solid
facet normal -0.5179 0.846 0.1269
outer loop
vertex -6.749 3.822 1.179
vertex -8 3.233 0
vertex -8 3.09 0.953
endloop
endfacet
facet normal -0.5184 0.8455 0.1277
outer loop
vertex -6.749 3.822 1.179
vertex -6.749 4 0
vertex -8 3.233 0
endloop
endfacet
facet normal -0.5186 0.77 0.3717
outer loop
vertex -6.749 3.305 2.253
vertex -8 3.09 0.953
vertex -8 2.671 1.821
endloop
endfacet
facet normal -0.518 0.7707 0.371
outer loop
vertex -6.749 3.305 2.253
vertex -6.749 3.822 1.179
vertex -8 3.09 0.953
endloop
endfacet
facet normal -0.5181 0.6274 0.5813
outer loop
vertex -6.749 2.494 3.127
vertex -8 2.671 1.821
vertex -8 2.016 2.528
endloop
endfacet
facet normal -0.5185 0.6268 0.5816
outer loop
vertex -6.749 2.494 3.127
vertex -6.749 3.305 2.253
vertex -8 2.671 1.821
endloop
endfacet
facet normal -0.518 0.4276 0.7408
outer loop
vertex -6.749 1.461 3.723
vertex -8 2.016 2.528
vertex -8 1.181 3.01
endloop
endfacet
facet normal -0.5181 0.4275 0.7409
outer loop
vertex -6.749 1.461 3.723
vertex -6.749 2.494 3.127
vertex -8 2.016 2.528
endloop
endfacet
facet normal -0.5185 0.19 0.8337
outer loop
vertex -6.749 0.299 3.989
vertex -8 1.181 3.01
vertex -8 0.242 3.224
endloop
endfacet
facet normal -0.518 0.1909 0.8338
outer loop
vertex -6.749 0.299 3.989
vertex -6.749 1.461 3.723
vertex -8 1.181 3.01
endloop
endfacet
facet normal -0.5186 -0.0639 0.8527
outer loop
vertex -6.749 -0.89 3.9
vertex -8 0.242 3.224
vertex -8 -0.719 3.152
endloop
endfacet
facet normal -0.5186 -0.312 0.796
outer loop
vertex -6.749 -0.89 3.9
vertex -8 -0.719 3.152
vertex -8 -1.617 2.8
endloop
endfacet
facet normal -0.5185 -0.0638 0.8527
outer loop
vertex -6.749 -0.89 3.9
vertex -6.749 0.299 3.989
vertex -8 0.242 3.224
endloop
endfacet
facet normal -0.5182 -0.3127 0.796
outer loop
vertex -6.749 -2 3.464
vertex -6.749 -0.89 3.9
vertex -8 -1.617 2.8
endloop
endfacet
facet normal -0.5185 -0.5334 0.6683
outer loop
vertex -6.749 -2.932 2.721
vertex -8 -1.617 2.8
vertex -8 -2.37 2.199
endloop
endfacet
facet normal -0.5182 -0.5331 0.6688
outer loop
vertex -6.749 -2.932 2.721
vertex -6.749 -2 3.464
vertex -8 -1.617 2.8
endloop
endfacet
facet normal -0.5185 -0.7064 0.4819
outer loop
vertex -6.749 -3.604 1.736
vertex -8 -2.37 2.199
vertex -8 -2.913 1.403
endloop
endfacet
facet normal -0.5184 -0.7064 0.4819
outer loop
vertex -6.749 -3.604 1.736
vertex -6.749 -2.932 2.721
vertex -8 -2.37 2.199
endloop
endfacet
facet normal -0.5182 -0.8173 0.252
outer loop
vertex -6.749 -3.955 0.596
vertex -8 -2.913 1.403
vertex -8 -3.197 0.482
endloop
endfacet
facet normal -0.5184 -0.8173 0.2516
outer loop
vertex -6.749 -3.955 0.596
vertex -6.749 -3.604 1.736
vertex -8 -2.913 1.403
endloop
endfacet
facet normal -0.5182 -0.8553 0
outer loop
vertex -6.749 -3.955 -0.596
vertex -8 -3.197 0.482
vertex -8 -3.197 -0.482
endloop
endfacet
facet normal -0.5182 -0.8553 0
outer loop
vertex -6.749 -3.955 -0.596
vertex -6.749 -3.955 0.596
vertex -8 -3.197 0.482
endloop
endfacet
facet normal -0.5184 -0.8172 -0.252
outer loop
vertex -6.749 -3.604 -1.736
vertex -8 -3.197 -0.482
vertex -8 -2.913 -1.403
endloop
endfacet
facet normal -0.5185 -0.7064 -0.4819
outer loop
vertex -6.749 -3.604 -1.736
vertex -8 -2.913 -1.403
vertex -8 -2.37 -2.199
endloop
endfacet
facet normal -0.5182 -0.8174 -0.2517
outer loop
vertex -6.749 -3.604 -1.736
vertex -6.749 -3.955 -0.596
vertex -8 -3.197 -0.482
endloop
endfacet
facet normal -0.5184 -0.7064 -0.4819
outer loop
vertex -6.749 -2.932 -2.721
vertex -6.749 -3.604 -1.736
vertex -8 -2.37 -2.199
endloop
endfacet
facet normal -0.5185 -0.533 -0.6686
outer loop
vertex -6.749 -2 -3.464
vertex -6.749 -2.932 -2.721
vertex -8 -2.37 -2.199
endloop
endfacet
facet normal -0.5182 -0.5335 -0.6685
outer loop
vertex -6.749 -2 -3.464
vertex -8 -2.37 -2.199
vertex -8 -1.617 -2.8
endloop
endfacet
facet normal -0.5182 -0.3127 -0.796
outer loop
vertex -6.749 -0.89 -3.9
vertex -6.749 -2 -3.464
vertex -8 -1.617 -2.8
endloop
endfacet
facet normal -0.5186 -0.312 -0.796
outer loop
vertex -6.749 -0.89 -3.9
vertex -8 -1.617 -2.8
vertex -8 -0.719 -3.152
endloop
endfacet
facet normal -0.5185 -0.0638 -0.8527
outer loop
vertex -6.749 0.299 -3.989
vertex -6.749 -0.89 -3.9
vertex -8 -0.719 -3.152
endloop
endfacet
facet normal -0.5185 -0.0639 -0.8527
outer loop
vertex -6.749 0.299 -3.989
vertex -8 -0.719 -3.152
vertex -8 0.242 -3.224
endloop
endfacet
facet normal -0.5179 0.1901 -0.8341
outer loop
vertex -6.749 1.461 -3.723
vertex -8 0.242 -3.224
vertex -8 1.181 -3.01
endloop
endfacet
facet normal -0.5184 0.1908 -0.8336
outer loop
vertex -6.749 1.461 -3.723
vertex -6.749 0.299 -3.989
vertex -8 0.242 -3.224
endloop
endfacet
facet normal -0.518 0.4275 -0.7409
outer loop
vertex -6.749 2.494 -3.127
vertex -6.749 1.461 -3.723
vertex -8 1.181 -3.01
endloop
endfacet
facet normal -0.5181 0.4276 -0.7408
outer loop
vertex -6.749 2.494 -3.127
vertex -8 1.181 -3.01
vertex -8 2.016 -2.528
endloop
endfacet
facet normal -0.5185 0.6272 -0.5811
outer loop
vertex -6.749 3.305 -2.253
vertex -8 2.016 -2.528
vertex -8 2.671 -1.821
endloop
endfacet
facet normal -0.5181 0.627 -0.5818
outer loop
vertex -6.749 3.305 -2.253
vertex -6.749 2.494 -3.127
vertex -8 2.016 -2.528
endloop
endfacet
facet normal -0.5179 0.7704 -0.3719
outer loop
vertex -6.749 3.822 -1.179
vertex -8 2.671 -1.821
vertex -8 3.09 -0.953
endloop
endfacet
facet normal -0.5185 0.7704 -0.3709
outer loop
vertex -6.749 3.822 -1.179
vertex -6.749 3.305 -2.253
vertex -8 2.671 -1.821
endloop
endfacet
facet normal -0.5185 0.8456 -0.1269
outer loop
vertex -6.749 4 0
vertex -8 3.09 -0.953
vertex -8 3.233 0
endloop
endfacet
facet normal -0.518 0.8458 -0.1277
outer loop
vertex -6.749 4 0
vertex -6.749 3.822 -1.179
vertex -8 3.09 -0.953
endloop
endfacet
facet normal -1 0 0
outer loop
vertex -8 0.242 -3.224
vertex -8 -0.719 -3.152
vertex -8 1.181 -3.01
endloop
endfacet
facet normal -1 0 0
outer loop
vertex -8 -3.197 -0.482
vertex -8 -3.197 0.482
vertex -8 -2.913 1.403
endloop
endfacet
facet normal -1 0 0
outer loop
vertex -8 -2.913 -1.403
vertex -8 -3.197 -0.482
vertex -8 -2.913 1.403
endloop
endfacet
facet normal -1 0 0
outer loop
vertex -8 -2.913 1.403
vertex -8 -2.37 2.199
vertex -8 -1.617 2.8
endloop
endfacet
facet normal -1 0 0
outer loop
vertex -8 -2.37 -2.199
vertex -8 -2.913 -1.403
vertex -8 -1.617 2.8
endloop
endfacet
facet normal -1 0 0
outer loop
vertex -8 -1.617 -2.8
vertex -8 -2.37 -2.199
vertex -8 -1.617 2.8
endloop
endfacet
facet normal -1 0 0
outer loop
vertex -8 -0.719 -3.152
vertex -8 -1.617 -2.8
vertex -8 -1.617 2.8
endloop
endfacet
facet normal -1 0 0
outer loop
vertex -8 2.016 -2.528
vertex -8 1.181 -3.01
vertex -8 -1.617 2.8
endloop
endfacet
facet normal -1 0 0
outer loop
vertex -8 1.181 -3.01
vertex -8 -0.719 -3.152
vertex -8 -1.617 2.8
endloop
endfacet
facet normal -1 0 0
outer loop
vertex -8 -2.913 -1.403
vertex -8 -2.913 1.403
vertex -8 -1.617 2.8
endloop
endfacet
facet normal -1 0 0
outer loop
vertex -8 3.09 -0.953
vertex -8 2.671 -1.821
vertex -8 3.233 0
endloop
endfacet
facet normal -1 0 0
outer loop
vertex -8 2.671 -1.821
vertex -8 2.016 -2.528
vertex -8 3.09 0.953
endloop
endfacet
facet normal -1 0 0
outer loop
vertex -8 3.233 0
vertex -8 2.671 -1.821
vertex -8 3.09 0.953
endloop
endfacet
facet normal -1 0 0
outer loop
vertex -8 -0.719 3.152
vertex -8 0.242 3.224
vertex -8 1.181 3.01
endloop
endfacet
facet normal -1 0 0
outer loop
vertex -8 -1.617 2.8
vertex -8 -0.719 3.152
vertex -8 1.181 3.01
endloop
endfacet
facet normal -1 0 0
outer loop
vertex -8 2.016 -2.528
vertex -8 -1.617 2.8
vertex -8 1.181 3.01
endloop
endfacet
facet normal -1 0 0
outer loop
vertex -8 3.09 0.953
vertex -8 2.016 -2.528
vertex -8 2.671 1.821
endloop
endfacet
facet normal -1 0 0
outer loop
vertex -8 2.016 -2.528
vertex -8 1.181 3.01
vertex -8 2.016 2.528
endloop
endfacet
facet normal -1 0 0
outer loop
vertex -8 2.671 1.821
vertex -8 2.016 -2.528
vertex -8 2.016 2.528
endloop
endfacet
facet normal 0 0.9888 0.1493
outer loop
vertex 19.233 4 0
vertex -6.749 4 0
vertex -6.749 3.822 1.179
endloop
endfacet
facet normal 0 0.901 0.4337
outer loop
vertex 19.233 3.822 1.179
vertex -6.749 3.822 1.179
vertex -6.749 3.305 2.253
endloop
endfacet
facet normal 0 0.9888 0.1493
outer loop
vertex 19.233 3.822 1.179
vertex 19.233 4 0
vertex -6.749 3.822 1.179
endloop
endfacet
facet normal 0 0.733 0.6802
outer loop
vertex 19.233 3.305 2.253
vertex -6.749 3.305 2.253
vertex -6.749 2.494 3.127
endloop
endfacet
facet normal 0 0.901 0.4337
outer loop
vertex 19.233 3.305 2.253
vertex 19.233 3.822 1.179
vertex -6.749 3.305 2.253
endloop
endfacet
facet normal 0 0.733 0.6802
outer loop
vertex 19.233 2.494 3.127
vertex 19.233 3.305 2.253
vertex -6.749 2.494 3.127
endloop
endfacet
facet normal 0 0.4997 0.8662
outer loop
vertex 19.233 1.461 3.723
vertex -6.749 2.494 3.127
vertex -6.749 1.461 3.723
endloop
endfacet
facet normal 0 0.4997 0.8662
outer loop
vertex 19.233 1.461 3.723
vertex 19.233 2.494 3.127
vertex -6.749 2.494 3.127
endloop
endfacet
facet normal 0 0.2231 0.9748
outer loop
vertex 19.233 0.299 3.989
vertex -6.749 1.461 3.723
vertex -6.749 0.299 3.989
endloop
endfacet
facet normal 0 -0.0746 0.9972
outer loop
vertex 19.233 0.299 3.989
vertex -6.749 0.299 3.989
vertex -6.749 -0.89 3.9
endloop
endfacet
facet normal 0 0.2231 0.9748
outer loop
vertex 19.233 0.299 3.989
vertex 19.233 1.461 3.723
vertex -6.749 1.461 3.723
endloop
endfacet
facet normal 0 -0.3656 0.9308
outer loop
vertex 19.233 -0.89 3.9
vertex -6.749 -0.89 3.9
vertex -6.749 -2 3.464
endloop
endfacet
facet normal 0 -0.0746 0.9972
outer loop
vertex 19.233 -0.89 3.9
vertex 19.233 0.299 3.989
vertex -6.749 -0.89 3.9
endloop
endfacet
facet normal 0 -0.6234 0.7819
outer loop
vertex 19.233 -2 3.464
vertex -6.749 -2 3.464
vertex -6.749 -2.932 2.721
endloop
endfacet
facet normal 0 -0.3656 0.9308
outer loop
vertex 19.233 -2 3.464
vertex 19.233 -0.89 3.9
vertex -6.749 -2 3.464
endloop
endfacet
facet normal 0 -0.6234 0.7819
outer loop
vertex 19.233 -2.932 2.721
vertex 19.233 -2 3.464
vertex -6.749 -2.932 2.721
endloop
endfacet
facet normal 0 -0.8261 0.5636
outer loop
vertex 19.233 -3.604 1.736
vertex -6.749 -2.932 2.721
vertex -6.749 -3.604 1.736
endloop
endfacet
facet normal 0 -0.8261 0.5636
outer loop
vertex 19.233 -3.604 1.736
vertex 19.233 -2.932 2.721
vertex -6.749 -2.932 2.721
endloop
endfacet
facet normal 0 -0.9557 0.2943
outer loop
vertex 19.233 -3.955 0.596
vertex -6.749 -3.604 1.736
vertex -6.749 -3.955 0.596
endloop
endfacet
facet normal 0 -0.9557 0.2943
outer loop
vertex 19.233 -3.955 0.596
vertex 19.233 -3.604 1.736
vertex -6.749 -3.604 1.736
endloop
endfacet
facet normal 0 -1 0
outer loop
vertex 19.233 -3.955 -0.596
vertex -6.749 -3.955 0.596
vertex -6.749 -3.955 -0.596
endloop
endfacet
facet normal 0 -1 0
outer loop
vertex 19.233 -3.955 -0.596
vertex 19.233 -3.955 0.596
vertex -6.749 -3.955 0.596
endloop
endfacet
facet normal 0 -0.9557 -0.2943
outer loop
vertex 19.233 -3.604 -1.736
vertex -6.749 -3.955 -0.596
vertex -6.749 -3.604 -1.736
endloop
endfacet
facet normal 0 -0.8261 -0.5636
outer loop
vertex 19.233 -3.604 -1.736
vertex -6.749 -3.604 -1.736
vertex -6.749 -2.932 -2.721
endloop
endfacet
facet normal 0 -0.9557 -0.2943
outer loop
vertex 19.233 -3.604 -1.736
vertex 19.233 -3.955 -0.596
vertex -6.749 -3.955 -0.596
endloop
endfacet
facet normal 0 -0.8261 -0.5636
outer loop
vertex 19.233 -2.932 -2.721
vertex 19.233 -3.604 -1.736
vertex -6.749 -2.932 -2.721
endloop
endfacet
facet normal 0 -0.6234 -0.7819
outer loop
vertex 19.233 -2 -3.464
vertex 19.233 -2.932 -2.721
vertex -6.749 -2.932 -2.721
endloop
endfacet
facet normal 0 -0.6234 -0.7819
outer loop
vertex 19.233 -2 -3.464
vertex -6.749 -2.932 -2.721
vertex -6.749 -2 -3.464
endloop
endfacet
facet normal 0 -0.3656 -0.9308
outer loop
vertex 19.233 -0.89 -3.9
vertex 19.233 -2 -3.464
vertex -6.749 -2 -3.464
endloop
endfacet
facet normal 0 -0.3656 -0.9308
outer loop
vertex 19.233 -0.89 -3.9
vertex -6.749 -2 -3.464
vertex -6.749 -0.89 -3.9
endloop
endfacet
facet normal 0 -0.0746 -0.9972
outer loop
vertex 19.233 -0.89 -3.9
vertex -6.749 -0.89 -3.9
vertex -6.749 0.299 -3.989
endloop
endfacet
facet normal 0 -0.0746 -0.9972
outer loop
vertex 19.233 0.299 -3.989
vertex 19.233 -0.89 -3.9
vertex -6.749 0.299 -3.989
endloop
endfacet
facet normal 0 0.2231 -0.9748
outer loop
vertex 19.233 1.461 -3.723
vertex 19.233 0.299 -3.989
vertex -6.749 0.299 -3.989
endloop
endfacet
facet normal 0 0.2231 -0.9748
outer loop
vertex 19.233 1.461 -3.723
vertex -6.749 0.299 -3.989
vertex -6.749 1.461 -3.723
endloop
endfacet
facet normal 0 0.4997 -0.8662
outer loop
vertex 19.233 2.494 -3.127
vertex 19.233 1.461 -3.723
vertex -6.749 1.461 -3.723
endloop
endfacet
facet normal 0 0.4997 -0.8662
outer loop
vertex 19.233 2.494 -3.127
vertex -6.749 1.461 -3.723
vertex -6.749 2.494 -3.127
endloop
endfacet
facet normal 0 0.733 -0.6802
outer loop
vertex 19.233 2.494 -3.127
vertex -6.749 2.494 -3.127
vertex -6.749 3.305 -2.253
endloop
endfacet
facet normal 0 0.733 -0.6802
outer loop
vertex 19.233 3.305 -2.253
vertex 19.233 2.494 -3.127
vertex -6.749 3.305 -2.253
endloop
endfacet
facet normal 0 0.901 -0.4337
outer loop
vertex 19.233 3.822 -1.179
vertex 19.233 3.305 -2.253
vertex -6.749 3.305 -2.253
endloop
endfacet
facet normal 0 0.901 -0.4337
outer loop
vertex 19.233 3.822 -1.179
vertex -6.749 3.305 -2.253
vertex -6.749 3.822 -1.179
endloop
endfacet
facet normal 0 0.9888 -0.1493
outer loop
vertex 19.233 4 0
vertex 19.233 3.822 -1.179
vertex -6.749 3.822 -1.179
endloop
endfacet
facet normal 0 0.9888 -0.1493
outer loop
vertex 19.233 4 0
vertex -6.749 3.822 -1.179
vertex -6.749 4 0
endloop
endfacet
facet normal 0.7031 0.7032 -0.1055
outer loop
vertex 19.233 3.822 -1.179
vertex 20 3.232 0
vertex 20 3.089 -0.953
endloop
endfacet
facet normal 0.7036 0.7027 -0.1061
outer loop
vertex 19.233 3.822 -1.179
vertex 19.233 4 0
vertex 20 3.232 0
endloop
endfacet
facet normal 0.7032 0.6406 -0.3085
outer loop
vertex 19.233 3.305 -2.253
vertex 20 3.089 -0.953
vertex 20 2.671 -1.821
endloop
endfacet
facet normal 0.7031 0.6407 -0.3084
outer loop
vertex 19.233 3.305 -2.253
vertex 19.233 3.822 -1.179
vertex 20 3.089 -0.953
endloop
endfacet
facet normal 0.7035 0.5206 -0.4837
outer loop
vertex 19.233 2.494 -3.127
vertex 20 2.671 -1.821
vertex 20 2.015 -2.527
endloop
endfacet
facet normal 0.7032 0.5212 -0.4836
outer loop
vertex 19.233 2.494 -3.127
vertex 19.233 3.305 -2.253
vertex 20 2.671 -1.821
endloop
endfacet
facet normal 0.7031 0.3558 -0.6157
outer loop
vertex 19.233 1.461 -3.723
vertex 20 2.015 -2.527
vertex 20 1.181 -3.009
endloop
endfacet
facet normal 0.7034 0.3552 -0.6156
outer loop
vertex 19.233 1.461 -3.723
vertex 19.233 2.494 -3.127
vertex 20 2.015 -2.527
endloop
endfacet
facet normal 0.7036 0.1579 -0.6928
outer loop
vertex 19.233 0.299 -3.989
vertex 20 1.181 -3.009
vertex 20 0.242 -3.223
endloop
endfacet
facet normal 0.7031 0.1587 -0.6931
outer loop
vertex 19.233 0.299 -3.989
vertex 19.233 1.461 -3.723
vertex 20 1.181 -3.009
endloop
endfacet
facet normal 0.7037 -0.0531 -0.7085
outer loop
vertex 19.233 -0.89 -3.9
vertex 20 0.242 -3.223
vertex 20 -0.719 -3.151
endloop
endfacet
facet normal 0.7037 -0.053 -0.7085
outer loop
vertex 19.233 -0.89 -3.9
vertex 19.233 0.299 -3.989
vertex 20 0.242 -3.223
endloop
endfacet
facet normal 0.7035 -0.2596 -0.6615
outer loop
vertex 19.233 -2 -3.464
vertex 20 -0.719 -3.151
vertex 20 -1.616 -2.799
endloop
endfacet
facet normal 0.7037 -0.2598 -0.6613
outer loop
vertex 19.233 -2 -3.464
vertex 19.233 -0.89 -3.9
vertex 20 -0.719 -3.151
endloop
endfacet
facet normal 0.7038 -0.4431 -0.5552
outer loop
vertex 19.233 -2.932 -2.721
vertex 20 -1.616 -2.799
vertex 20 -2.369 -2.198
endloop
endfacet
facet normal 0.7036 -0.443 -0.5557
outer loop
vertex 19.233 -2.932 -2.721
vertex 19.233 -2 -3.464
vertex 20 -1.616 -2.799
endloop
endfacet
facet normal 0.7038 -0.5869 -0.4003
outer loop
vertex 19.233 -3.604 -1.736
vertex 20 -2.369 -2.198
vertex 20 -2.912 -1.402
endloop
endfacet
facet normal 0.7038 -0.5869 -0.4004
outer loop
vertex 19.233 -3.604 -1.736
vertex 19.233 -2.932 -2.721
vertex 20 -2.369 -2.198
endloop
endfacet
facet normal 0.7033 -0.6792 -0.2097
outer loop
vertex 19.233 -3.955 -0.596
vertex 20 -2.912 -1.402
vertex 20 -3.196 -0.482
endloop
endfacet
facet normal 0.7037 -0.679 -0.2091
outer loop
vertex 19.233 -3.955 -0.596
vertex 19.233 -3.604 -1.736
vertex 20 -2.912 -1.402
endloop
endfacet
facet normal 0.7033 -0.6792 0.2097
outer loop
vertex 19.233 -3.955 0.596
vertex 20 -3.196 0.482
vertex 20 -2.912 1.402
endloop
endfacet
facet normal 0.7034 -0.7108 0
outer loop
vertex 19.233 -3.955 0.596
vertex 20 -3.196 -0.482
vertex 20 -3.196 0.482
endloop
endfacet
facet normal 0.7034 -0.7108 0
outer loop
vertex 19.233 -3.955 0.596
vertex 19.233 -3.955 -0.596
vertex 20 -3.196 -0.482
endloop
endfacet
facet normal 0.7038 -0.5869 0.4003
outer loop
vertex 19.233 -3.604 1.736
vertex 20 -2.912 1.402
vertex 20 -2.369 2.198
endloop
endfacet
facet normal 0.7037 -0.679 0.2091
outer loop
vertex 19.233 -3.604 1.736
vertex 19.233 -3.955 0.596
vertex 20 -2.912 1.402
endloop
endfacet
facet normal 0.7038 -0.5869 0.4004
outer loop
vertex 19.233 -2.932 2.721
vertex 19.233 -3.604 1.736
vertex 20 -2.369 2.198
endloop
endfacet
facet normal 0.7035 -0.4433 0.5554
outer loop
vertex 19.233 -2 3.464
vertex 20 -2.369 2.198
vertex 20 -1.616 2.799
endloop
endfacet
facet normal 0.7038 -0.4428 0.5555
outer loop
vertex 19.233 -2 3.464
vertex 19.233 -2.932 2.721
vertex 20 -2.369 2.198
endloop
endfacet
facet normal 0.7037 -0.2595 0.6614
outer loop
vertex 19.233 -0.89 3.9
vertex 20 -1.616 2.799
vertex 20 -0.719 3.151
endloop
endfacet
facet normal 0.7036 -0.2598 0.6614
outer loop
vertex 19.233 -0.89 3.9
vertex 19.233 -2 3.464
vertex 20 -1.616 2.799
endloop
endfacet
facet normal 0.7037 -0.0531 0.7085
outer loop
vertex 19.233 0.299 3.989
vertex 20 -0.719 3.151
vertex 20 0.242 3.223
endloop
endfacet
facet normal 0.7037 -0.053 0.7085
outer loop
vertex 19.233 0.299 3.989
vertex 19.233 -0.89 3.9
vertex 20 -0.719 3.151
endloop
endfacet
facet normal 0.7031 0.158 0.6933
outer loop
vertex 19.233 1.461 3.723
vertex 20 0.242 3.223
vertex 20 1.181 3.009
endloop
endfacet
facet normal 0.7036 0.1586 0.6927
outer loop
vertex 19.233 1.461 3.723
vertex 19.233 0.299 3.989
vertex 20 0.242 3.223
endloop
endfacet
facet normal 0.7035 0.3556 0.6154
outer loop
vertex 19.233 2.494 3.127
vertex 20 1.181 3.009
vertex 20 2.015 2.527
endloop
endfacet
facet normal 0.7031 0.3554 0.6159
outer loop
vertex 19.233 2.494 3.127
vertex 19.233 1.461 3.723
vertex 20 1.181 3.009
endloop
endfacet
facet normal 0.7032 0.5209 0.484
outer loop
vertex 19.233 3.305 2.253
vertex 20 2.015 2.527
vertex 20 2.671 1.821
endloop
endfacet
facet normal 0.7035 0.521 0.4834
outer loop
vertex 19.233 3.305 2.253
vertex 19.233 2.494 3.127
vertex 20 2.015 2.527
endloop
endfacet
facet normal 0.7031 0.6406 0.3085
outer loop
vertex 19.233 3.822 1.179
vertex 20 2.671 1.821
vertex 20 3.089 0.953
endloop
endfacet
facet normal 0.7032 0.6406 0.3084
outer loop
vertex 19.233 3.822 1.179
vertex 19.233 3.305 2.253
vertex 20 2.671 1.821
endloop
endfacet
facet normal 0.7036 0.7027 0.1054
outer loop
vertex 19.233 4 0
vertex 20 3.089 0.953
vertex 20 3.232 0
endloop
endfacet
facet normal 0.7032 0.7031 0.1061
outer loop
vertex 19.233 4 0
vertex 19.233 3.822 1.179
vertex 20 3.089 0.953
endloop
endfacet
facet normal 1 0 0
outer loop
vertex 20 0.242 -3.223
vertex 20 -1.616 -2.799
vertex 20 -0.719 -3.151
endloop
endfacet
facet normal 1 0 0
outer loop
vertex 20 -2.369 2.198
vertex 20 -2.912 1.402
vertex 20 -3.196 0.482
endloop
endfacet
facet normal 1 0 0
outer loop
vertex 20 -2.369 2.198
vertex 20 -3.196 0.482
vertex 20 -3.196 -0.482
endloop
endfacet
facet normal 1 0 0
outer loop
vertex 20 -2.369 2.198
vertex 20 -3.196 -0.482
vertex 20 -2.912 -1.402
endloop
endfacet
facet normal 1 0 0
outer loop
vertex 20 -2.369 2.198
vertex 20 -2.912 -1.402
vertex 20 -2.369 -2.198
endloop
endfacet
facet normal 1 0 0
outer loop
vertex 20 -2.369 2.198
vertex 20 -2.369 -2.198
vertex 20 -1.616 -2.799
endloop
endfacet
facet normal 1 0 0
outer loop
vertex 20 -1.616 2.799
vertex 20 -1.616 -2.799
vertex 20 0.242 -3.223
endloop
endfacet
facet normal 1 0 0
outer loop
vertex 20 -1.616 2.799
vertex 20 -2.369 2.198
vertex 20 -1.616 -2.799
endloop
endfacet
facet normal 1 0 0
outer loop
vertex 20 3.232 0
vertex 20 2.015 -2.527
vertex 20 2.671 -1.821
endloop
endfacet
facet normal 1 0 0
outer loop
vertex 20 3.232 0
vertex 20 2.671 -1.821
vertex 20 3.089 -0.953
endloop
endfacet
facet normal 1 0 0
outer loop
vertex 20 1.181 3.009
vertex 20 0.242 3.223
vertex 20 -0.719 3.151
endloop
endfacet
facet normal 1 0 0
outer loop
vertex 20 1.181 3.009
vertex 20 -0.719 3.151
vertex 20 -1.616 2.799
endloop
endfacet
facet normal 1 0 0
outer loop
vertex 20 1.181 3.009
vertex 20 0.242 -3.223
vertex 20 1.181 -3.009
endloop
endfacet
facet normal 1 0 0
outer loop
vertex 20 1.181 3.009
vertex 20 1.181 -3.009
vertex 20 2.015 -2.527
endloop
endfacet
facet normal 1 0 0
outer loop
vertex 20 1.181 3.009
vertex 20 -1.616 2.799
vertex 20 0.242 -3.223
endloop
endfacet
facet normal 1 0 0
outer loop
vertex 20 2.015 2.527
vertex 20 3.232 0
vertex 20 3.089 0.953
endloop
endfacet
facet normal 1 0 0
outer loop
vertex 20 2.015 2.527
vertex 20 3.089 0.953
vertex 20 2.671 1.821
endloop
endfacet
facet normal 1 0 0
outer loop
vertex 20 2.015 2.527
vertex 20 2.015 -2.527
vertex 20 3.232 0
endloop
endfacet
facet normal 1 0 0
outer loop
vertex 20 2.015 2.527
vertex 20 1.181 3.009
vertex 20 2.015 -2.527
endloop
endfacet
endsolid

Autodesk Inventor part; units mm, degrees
ref_plane "YZ Plane" through (0, 0, 0) normal (1, 0, 0) x (0, 1, 0)
ref_plane "XZ Plane" through (0, 0, 0) normal (0, 1, 0) x (-1, 0, 0)
sketch "Skizze1" plane through (0, 0, 0) normal (0, 0, 1) x (1, 0, 0)
  line L0 (20, 4) -> (20, 0)
  line L1 (-8, 0) -> (20, 0)
  line L2 (-13.6, 0) -> (25.6, 0) projected
  line L3 (0, 4.8) -> (0, -0.8) projected
  line L4 (-8, 4) -> (-8, 0)
  line L5 (2, 4) -> (2, 0) construction
  line L6 (-13.6, 0) -> (25.6, 0) projected
  line L7 (-8, 4) -> (20, 4)
  dimension "d4" = 8
  dimension "d5" = 20
  dimension "d6" = 18
  dimension "d13" = 8
revolve "Körper" add sketch "Skizze1" angle 360 about axis through (-8, 0, 0) along (1, 0, 0)
thread "Gewinde1" size "M8x1.25" class "6g" standard "ISO Metric profile" length 8
thread "Gewinde2" size "M8x1.25" class "6g" standard "ISO Metric profile" length 18.7668
chamfer "Fase1" distance 0.7678 distance2 0.7668 1 edges at (20, -4, 0) measured on face at (20, -0.0467, 2.2623)
chamfer "Fase2" distance 1.251 distance2 0.7668 1 edges at (-8, -4, 0) measured on face at (10.1555, 3.987, -0.3219)
ref_plane "Work Plane1" through (2.75, 0, 0) normal (0, -1, 0) x (1, 0, 0)
equation "\"d4\" = KOH"
equation "\"d5\" = NLG"
equation "\"d6\" = GEL"
equation "\"d13\" = GD"
equation "\"d1\" = KOH"
equation "\"d7\" = GEL + GAL"
equation "\"d10\" = -0.5 * SPD + 0.5 * GD"
equation "\"d12\" = -0.5 * SPD + 0.5 * GD"
equation "\"NLG\" = 20"
equation "\"GEL\" = 18"
equation "\"GAL\" = 0.61345 * PTC"
equation "\"SPD\" = NND - 1.2269 * PTC"
equation "\"d0\" = GD"
equation "\"GUL\" = 0.61345 * PTC"
equation "\"KOH\" = NND"
equation "\"GD\" = NND"
equation "\"BDM\" = NND"
equation "\"GUL1\" = 1.25"
equation "\"GAL1\" = 1.25"
equation "\"d80\" = -GUL - GEL"
equation "\"d86\" = -KOH + GUL1"
equation "\"PTC\" = 1.25"
equation "\"THREADDIA\" = 8"
equation "\"TOA\" = 30deg"
equation "\"NND\" = 8"
equation "\"GD1\" = THREADDIA - 1.2269 * PTC"
properties part number "CSN 02 1174 - A M8 x 20" material "Stahl, weich"
